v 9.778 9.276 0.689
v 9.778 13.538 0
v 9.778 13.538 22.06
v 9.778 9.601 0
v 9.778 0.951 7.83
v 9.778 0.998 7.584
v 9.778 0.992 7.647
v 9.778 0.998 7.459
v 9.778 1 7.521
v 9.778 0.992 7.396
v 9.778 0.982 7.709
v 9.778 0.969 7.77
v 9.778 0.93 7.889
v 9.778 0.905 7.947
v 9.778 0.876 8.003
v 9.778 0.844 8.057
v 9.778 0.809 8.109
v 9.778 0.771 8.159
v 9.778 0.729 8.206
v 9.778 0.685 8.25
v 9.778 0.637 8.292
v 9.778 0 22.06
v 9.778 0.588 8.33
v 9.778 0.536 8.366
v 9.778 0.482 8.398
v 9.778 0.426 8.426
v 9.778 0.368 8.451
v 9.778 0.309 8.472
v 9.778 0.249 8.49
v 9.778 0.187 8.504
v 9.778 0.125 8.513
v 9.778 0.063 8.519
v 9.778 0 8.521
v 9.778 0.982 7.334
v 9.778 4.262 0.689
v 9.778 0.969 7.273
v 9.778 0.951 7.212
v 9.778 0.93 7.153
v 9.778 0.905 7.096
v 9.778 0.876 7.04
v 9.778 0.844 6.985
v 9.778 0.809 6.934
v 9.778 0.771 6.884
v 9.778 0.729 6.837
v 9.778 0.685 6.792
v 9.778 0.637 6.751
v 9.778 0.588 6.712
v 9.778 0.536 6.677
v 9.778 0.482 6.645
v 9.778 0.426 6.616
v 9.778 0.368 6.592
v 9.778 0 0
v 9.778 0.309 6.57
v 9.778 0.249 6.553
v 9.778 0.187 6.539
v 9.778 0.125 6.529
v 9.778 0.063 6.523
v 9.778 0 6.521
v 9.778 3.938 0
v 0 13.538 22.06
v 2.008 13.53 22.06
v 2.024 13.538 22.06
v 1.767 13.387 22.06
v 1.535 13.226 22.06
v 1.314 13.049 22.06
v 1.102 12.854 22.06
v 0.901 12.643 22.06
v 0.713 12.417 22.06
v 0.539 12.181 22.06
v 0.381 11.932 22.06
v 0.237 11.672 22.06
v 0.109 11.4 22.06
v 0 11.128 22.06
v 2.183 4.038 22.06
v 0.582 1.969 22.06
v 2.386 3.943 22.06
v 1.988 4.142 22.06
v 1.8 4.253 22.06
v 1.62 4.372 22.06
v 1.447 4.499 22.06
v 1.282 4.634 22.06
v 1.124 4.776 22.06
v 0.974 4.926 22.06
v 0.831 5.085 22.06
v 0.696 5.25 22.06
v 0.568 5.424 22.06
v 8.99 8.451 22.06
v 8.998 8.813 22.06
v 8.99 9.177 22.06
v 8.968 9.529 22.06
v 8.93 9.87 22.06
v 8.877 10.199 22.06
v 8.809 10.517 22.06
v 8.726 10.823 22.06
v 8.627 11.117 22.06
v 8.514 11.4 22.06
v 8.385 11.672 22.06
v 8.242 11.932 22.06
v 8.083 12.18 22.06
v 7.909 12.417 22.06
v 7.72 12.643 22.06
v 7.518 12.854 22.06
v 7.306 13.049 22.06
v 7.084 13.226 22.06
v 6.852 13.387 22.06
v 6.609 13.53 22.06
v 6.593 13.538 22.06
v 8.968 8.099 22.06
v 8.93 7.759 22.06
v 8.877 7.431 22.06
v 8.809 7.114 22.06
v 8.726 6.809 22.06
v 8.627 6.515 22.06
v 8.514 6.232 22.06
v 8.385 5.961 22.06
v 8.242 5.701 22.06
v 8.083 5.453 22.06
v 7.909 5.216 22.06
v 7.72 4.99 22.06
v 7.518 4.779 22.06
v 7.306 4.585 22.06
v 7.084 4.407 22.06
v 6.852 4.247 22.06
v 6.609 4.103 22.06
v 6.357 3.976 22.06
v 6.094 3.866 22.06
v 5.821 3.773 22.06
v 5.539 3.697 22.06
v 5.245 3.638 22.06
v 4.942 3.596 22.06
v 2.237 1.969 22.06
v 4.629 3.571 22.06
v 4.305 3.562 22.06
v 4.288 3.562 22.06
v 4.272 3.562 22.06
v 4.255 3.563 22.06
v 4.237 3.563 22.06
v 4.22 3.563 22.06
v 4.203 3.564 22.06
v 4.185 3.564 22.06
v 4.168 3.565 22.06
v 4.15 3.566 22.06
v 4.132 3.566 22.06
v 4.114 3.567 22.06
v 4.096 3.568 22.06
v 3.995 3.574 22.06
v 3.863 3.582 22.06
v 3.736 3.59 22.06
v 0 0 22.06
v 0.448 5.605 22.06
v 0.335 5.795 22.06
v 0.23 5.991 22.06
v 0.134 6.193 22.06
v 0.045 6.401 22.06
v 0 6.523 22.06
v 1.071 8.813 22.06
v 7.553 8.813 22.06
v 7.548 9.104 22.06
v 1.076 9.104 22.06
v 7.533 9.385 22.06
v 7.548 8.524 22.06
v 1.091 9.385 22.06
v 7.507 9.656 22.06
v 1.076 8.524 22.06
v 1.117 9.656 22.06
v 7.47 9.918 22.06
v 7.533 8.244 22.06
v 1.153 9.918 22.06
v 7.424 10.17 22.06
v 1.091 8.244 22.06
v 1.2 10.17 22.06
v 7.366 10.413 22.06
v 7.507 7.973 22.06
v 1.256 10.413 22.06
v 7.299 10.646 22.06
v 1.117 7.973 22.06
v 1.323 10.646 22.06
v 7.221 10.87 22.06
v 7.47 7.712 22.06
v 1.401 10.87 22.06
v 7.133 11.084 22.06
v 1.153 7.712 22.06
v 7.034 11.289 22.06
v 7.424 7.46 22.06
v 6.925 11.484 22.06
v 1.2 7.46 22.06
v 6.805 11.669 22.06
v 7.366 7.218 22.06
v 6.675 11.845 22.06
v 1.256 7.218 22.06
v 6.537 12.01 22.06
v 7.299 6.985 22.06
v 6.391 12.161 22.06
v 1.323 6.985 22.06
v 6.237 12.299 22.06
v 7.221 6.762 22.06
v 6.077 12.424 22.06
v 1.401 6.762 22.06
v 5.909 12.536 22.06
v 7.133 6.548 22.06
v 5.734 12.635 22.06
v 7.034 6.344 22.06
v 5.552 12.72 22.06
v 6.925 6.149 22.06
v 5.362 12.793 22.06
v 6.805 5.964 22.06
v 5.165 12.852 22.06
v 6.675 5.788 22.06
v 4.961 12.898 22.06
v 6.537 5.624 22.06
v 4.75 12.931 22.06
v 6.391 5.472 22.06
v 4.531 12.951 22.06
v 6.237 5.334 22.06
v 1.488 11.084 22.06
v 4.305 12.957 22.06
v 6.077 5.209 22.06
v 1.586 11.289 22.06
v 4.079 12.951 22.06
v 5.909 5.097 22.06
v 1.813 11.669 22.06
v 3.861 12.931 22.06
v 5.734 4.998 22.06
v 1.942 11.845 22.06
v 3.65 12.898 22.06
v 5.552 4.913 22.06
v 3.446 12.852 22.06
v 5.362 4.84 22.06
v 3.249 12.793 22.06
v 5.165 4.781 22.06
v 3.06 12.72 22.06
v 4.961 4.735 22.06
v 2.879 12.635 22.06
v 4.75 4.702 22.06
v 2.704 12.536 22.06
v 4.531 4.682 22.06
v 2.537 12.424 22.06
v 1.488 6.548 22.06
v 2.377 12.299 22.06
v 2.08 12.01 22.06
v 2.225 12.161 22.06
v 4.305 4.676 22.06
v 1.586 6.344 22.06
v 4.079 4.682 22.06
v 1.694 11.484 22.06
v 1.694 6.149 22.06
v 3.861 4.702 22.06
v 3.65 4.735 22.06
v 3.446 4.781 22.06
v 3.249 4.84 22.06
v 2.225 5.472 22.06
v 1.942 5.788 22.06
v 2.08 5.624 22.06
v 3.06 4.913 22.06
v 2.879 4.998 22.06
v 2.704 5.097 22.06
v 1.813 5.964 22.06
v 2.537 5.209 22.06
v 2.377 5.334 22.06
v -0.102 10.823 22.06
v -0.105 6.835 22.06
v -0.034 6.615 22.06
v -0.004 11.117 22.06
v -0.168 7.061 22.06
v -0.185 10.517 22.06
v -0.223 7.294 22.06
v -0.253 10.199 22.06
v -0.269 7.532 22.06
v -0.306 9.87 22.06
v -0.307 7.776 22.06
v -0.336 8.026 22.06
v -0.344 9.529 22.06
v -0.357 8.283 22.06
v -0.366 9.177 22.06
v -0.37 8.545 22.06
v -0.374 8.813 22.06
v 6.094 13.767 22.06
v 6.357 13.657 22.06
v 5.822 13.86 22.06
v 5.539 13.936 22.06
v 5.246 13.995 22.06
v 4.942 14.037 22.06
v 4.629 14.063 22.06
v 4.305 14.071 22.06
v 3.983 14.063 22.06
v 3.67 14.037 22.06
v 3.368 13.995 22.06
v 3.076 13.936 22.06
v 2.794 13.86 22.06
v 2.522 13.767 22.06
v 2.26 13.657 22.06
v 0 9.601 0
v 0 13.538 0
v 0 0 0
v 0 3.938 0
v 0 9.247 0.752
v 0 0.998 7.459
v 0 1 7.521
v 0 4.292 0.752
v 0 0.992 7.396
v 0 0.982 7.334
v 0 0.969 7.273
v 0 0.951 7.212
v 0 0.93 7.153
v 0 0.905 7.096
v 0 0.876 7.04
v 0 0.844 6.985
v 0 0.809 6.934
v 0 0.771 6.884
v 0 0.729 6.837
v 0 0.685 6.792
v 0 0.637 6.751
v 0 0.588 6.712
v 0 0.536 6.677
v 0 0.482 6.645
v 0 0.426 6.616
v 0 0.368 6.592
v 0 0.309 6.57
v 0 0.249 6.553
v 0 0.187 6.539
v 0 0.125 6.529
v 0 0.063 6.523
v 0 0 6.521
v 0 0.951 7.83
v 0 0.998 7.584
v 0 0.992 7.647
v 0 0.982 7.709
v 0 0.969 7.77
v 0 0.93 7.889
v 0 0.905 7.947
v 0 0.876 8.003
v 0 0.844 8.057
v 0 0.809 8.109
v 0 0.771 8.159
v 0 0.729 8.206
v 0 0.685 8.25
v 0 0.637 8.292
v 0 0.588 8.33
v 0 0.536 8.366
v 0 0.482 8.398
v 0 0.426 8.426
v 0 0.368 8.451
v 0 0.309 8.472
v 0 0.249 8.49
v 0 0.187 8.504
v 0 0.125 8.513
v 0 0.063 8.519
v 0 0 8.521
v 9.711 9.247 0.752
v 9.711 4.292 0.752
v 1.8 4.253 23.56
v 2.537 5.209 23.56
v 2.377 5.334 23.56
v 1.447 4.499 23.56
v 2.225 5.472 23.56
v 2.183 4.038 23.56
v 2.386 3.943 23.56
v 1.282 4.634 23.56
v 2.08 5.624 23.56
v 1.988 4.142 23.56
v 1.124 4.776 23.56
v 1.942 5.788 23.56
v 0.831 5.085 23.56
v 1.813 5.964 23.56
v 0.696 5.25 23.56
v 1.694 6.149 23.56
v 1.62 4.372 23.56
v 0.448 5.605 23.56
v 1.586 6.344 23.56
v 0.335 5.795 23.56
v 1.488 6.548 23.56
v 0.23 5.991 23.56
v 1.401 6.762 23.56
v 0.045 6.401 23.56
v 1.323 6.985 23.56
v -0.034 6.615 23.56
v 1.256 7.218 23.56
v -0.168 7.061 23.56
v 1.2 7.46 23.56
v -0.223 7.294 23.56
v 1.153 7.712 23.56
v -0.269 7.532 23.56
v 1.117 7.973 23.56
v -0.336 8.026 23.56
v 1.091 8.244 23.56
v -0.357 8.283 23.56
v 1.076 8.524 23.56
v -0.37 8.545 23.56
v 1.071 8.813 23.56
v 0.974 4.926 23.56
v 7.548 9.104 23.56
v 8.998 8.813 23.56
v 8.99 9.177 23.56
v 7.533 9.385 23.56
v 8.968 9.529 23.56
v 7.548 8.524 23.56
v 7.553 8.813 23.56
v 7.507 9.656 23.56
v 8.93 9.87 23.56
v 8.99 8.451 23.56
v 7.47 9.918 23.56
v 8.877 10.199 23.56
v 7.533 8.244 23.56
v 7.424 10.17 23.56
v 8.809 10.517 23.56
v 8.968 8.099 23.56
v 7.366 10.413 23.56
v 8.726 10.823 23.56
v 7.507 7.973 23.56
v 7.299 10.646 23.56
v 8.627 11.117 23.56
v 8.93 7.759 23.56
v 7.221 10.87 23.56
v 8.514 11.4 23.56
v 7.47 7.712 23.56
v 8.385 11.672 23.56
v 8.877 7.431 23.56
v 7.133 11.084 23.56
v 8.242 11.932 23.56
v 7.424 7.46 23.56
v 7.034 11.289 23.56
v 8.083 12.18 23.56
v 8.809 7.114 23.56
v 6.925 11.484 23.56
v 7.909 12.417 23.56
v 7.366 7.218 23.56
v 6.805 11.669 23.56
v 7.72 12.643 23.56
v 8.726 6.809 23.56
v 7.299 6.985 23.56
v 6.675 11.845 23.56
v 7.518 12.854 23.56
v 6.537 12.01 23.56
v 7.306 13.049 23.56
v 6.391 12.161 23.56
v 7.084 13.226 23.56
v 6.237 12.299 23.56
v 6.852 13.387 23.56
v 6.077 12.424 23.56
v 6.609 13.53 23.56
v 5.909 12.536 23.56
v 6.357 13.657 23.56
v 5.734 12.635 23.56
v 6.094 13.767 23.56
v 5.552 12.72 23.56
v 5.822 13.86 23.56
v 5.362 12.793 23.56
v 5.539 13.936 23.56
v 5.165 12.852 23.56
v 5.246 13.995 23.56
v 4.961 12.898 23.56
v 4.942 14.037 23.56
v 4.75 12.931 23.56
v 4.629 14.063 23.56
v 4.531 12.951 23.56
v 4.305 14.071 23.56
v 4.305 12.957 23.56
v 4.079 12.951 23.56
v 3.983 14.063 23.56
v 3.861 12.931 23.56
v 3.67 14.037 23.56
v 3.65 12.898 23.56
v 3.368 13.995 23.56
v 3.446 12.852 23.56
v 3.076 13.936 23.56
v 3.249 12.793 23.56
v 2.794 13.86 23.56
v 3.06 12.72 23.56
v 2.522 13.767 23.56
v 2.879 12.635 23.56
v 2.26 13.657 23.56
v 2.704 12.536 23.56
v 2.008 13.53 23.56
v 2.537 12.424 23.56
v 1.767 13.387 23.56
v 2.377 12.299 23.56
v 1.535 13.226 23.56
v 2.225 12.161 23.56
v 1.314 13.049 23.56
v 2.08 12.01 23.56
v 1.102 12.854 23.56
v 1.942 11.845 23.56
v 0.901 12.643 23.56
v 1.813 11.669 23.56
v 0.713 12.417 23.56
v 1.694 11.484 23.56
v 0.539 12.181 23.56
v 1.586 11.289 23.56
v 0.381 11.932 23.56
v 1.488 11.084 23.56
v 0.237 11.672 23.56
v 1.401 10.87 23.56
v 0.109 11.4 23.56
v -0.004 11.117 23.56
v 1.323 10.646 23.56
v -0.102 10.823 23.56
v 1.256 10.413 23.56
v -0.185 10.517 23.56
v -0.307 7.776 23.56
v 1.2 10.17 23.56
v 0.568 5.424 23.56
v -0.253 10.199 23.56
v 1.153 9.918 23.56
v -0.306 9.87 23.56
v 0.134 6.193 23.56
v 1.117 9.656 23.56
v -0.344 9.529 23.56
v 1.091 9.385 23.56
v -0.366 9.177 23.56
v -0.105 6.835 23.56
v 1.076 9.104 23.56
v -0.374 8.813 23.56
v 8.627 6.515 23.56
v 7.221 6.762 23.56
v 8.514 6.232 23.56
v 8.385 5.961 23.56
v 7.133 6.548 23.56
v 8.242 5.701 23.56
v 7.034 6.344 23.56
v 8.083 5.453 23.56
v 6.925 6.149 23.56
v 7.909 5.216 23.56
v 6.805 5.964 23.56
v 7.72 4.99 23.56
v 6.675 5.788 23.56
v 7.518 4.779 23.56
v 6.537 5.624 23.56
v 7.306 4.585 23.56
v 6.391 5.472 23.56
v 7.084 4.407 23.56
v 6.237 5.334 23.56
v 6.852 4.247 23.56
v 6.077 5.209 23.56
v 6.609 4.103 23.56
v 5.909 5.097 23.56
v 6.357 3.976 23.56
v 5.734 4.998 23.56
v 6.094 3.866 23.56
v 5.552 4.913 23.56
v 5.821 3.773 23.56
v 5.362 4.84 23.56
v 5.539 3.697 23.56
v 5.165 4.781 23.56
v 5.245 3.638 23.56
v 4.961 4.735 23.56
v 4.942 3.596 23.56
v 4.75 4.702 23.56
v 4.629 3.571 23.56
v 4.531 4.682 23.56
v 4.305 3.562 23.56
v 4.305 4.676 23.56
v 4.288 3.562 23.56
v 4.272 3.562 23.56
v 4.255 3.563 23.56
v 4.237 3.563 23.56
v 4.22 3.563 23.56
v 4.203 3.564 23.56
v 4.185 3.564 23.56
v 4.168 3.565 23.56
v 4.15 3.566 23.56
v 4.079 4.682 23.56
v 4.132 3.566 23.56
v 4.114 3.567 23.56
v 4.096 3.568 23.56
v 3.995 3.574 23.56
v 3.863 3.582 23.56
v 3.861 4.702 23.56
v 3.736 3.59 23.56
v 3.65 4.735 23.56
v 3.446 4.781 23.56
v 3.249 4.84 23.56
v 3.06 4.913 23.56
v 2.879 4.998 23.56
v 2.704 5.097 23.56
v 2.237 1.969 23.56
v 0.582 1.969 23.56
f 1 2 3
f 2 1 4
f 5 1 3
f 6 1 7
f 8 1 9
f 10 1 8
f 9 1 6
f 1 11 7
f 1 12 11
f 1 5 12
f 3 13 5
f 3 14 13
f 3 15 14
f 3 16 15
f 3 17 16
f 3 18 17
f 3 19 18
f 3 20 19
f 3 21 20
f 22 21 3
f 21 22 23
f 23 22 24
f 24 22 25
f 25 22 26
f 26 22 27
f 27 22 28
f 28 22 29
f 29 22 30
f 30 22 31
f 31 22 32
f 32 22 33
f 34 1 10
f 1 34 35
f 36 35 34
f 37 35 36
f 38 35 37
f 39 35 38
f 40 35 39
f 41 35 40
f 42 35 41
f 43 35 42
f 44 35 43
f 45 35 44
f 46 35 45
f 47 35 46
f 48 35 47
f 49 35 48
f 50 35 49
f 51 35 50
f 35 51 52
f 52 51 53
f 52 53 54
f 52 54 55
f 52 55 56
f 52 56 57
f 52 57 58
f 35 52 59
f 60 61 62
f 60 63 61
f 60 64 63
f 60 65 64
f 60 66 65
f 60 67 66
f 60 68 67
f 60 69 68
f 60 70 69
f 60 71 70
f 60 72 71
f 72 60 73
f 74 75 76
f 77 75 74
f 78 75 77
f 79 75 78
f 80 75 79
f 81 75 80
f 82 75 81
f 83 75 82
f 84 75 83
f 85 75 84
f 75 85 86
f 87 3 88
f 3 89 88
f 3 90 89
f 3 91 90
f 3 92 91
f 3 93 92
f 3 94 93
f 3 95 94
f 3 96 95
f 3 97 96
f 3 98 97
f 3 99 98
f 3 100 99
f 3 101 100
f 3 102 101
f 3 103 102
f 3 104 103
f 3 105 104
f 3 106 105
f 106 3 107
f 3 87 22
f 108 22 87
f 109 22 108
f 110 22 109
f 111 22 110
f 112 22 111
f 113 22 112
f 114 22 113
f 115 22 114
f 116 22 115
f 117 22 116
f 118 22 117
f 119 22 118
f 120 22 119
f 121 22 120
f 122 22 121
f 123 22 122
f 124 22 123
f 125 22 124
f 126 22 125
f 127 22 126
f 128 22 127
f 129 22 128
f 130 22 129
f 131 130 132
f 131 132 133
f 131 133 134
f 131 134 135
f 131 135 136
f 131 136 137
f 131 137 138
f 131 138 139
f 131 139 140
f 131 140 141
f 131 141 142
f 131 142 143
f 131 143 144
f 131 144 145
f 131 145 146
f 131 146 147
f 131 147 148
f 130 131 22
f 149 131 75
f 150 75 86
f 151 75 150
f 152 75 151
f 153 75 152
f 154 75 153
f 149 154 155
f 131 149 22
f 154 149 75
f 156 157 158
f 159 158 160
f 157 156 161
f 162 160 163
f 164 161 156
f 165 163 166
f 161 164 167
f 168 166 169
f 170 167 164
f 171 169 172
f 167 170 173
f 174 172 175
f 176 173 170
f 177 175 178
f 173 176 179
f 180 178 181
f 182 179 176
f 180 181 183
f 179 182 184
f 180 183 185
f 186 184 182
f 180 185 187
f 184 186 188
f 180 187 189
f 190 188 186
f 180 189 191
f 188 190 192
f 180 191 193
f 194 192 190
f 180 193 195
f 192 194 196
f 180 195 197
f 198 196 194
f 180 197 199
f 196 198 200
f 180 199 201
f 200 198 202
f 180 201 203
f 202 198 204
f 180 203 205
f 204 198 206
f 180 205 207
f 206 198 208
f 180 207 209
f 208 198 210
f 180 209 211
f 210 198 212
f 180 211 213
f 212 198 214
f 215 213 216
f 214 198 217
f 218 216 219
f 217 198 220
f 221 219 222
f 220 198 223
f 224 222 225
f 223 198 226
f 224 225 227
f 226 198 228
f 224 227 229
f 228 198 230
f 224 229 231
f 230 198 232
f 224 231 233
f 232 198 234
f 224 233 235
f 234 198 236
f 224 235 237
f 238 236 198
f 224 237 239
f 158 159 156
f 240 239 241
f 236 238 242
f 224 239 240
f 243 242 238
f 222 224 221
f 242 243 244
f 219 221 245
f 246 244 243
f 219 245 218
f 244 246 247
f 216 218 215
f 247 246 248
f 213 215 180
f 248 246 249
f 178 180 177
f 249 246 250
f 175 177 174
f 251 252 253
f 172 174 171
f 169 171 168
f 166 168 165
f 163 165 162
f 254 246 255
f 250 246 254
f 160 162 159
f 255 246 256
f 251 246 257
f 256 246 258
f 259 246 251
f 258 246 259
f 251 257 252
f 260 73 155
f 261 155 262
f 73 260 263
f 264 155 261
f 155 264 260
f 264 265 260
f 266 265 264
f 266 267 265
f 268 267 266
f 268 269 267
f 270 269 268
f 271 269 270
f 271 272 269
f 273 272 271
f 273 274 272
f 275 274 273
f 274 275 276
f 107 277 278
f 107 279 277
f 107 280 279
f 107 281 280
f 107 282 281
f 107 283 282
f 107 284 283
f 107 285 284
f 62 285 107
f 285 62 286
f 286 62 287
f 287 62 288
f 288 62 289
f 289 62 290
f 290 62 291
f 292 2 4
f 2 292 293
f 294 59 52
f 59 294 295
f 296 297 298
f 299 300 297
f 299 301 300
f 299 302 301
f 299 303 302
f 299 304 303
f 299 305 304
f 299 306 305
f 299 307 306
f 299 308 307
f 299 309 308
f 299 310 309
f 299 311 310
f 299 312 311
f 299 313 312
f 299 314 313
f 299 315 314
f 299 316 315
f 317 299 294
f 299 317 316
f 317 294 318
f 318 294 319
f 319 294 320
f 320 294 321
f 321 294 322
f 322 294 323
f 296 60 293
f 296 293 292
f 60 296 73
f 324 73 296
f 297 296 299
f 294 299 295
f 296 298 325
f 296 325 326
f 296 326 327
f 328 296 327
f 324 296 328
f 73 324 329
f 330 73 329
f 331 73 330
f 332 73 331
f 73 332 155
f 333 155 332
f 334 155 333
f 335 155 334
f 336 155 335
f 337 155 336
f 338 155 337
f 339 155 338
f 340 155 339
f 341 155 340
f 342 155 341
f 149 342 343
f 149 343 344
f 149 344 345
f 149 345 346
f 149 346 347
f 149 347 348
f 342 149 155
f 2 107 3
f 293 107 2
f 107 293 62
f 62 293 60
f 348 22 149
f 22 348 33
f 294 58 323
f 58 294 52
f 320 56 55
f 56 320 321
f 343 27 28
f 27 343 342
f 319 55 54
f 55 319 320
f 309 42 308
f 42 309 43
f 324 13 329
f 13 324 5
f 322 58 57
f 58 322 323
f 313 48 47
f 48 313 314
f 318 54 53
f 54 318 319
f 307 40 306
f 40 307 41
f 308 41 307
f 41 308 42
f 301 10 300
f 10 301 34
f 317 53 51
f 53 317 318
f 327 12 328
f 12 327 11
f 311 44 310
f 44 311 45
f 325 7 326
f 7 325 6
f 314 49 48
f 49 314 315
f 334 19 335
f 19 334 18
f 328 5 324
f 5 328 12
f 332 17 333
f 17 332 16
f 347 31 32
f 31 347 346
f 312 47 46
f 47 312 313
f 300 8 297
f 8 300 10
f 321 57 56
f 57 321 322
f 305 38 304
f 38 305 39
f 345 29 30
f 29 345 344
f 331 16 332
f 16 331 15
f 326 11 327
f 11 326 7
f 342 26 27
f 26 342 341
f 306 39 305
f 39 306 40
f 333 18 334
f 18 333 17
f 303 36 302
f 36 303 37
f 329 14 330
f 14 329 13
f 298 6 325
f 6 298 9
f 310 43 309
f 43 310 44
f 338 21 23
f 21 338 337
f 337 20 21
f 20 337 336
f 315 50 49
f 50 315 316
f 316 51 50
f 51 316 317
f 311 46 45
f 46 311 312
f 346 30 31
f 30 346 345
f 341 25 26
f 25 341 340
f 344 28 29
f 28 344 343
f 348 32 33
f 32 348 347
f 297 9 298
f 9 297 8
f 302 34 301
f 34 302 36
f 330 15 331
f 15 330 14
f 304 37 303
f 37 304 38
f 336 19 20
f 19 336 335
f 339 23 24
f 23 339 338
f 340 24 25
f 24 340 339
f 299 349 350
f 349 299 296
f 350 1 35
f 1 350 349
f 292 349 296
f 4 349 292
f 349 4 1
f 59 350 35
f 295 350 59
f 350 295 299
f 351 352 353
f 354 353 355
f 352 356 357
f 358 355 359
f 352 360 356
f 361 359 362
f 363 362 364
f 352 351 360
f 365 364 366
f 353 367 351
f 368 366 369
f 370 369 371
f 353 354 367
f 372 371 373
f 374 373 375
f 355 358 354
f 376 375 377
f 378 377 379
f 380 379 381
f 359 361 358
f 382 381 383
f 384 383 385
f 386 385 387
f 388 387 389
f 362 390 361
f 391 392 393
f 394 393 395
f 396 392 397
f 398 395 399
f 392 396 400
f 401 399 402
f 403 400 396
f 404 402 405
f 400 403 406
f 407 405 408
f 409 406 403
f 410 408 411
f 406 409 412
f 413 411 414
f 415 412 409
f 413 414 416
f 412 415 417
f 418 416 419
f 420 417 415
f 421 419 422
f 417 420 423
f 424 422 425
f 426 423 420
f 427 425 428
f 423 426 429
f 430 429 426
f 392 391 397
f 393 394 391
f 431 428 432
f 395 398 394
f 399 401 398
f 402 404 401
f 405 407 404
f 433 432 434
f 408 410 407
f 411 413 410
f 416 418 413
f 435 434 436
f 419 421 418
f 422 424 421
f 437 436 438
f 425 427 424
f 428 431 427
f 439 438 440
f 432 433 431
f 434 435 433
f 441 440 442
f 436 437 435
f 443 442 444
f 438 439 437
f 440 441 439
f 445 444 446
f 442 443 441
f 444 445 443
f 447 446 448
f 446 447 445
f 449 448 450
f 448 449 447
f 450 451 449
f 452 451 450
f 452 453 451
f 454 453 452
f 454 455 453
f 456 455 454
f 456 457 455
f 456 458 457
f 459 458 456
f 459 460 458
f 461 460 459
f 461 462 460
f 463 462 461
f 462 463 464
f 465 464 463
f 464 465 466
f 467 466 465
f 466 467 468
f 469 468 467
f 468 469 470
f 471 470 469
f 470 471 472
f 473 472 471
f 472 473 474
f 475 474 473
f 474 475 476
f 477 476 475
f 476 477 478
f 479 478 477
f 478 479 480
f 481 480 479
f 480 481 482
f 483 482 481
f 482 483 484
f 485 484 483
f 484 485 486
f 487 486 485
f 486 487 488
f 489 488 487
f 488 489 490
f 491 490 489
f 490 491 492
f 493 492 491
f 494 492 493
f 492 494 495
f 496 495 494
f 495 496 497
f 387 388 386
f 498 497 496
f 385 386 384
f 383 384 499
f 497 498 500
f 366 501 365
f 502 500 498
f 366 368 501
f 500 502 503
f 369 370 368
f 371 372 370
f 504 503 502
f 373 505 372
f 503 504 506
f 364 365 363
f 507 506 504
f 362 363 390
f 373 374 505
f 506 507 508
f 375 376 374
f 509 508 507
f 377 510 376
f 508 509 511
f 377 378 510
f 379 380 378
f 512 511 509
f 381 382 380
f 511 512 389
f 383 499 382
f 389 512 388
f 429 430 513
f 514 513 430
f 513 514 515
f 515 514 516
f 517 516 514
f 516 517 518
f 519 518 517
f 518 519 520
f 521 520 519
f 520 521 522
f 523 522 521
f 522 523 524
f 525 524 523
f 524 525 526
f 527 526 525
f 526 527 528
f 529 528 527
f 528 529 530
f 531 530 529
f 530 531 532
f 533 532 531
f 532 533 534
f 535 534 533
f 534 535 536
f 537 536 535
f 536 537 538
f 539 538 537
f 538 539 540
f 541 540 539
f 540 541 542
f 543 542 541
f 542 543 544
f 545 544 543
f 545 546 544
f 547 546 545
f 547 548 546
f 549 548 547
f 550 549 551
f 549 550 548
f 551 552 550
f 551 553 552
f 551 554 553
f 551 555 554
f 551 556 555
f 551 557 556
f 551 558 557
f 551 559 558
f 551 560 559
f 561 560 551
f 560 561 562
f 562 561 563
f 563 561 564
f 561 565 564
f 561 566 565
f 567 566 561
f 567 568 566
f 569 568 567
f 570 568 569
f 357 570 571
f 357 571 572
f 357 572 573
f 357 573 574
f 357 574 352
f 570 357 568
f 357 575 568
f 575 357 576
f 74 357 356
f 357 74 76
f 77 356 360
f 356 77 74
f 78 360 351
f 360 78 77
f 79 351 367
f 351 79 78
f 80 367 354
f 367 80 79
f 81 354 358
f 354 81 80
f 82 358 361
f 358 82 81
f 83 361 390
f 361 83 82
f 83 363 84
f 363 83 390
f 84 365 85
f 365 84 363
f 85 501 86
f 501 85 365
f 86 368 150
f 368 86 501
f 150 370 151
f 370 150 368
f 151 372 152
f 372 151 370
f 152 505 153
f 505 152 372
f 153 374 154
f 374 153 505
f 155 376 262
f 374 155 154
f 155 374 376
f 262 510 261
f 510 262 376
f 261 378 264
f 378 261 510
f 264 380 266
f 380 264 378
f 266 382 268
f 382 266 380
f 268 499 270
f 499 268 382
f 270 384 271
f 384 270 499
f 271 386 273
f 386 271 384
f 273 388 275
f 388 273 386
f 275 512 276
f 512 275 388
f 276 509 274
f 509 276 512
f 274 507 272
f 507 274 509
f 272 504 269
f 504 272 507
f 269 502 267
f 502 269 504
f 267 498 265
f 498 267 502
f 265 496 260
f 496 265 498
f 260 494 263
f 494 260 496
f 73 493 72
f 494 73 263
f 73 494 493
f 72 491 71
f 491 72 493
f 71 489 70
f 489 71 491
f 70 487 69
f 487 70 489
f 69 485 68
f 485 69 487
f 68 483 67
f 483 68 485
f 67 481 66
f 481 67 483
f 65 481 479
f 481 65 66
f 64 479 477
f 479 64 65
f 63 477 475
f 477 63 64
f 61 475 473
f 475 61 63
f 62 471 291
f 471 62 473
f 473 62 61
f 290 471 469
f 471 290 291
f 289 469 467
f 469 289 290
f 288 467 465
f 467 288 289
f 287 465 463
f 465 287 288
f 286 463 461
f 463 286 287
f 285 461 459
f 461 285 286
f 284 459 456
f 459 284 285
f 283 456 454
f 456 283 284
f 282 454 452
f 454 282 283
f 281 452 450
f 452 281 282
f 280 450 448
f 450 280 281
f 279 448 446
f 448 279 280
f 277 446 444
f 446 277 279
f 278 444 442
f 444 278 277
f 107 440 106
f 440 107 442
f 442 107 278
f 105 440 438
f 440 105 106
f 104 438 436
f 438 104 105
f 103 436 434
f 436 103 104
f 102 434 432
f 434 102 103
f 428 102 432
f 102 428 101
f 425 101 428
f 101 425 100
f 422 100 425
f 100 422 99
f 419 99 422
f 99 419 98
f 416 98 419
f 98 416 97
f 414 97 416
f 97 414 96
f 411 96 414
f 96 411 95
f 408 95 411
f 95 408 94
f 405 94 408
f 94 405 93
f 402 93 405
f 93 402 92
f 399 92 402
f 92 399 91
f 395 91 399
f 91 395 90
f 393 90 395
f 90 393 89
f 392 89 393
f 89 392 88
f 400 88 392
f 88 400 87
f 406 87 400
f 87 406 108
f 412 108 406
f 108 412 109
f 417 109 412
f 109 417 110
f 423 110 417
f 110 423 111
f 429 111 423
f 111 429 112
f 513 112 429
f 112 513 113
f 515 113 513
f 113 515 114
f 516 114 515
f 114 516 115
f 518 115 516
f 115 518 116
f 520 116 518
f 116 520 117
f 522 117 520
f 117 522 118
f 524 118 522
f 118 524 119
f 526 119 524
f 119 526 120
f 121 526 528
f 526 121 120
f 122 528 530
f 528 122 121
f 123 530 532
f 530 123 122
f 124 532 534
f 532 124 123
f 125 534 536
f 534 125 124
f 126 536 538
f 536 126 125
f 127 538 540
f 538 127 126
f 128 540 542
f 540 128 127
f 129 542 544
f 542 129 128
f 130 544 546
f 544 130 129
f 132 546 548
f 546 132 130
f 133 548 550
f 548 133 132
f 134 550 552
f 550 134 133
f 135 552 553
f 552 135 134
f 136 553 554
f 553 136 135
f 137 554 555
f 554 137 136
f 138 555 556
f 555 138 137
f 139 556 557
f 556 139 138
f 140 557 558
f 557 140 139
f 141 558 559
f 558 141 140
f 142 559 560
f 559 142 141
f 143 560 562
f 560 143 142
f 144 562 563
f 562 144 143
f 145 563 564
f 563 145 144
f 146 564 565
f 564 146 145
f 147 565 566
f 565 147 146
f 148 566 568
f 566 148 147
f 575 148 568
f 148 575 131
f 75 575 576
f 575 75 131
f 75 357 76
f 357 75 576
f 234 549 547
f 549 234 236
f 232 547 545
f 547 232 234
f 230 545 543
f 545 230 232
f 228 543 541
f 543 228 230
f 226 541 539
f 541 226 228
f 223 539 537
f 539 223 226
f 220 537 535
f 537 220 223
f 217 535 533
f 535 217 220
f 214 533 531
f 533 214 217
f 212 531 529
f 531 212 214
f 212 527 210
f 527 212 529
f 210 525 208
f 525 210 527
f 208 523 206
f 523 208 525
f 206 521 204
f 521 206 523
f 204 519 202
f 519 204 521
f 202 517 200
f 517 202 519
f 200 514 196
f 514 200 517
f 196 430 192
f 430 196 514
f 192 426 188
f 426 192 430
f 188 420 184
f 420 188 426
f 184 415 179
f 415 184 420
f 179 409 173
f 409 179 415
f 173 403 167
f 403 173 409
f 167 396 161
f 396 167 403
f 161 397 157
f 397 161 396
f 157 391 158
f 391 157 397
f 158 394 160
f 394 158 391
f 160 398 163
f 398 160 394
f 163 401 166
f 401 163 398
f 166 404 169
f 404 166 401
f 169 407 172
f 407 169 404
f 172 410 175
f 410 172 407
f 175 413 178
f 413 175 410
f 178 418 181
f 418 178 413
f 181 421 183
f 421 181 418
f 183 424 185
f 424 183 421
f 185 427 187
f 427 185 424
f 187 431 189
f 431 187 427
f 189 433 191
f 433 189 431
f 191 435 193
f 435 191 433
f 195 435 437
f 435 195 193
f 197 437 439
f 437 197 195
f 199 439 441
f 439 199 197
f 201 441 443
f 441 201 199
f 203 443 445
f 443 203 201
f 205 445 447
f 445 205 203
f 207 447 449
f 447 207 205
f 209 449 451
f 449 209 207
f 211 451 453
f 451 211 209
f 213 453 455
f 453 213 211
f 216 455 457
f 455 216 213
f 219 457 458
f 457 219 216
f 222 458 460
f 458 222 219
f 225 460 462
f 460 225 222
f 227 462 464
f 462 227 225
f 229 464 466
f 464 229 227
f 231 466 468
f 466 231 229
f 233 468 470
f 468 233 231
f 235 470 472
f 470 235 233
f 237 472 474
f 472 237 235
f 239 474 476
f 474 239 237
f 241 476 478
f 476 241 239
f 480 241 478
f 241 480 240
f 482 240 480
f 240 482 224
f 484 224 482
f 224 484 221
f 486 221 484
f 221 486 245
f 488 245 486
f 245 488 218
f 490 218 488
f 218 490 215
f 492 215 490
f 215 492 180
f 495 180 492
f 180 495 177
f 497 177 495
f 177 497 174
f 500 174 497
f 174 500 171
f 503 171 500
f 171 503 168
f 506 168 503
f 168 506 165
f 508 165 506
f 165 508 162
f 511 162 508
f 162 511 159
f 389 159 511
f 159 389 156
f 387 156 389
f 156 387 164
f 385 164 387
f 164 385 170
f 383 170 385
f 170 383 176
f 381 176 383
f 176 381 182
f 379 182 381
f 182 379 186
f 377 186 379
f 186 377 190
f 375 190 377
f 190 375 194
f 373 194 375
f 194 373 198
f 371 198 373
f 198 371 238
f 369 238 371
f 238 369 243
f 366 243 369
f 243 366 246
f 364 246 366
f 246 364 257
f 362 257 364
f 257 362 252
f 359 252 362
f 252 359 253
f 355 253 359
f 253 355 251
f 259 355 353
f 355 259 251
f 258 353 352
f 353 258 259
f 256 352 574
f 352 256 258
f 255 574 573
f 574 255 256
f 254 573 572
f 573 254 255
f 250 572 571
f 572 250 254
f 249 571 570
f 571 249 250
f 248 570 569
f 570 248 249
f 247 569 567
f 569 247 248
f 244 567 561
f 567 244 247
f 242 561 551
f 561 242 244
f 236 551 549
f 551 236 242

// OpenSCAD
point = 0.376065;
hauteur_typo = 23.56;
hauteur_oeil = 1.5;
hauteur_moule = hauteur_typo - hauteur_oeil;
police = "Linux Libertine G";
taille = 36 * point;
largeur = 26 * point;

// Corps du caractère
difference() {
    // Corps principal
    cube([largeur, taille, hauteur_moule]);
    
    // Cran
    translate([-point, 0, 20 * point])
        rotate([0, 90, 0])
            cylinder(h = largeur + 2 * point, r = 1, $fn = 100);

    // Gouttière
    translate([largeur - 15 * point, 18 * point, -point])
        linear_extrude(height = 3 * point, scale = 14/17)
            square([largeur + 10 * point, taille - 20 * point], center = true);

}

// Lettre Q
translate([largeur, 10 * point, hauteur_moule])
    mirror([1, 0, 0])
        linear_extrude(height = hauteur_oeil)
            text("Q", font = police, $fn = 100);
